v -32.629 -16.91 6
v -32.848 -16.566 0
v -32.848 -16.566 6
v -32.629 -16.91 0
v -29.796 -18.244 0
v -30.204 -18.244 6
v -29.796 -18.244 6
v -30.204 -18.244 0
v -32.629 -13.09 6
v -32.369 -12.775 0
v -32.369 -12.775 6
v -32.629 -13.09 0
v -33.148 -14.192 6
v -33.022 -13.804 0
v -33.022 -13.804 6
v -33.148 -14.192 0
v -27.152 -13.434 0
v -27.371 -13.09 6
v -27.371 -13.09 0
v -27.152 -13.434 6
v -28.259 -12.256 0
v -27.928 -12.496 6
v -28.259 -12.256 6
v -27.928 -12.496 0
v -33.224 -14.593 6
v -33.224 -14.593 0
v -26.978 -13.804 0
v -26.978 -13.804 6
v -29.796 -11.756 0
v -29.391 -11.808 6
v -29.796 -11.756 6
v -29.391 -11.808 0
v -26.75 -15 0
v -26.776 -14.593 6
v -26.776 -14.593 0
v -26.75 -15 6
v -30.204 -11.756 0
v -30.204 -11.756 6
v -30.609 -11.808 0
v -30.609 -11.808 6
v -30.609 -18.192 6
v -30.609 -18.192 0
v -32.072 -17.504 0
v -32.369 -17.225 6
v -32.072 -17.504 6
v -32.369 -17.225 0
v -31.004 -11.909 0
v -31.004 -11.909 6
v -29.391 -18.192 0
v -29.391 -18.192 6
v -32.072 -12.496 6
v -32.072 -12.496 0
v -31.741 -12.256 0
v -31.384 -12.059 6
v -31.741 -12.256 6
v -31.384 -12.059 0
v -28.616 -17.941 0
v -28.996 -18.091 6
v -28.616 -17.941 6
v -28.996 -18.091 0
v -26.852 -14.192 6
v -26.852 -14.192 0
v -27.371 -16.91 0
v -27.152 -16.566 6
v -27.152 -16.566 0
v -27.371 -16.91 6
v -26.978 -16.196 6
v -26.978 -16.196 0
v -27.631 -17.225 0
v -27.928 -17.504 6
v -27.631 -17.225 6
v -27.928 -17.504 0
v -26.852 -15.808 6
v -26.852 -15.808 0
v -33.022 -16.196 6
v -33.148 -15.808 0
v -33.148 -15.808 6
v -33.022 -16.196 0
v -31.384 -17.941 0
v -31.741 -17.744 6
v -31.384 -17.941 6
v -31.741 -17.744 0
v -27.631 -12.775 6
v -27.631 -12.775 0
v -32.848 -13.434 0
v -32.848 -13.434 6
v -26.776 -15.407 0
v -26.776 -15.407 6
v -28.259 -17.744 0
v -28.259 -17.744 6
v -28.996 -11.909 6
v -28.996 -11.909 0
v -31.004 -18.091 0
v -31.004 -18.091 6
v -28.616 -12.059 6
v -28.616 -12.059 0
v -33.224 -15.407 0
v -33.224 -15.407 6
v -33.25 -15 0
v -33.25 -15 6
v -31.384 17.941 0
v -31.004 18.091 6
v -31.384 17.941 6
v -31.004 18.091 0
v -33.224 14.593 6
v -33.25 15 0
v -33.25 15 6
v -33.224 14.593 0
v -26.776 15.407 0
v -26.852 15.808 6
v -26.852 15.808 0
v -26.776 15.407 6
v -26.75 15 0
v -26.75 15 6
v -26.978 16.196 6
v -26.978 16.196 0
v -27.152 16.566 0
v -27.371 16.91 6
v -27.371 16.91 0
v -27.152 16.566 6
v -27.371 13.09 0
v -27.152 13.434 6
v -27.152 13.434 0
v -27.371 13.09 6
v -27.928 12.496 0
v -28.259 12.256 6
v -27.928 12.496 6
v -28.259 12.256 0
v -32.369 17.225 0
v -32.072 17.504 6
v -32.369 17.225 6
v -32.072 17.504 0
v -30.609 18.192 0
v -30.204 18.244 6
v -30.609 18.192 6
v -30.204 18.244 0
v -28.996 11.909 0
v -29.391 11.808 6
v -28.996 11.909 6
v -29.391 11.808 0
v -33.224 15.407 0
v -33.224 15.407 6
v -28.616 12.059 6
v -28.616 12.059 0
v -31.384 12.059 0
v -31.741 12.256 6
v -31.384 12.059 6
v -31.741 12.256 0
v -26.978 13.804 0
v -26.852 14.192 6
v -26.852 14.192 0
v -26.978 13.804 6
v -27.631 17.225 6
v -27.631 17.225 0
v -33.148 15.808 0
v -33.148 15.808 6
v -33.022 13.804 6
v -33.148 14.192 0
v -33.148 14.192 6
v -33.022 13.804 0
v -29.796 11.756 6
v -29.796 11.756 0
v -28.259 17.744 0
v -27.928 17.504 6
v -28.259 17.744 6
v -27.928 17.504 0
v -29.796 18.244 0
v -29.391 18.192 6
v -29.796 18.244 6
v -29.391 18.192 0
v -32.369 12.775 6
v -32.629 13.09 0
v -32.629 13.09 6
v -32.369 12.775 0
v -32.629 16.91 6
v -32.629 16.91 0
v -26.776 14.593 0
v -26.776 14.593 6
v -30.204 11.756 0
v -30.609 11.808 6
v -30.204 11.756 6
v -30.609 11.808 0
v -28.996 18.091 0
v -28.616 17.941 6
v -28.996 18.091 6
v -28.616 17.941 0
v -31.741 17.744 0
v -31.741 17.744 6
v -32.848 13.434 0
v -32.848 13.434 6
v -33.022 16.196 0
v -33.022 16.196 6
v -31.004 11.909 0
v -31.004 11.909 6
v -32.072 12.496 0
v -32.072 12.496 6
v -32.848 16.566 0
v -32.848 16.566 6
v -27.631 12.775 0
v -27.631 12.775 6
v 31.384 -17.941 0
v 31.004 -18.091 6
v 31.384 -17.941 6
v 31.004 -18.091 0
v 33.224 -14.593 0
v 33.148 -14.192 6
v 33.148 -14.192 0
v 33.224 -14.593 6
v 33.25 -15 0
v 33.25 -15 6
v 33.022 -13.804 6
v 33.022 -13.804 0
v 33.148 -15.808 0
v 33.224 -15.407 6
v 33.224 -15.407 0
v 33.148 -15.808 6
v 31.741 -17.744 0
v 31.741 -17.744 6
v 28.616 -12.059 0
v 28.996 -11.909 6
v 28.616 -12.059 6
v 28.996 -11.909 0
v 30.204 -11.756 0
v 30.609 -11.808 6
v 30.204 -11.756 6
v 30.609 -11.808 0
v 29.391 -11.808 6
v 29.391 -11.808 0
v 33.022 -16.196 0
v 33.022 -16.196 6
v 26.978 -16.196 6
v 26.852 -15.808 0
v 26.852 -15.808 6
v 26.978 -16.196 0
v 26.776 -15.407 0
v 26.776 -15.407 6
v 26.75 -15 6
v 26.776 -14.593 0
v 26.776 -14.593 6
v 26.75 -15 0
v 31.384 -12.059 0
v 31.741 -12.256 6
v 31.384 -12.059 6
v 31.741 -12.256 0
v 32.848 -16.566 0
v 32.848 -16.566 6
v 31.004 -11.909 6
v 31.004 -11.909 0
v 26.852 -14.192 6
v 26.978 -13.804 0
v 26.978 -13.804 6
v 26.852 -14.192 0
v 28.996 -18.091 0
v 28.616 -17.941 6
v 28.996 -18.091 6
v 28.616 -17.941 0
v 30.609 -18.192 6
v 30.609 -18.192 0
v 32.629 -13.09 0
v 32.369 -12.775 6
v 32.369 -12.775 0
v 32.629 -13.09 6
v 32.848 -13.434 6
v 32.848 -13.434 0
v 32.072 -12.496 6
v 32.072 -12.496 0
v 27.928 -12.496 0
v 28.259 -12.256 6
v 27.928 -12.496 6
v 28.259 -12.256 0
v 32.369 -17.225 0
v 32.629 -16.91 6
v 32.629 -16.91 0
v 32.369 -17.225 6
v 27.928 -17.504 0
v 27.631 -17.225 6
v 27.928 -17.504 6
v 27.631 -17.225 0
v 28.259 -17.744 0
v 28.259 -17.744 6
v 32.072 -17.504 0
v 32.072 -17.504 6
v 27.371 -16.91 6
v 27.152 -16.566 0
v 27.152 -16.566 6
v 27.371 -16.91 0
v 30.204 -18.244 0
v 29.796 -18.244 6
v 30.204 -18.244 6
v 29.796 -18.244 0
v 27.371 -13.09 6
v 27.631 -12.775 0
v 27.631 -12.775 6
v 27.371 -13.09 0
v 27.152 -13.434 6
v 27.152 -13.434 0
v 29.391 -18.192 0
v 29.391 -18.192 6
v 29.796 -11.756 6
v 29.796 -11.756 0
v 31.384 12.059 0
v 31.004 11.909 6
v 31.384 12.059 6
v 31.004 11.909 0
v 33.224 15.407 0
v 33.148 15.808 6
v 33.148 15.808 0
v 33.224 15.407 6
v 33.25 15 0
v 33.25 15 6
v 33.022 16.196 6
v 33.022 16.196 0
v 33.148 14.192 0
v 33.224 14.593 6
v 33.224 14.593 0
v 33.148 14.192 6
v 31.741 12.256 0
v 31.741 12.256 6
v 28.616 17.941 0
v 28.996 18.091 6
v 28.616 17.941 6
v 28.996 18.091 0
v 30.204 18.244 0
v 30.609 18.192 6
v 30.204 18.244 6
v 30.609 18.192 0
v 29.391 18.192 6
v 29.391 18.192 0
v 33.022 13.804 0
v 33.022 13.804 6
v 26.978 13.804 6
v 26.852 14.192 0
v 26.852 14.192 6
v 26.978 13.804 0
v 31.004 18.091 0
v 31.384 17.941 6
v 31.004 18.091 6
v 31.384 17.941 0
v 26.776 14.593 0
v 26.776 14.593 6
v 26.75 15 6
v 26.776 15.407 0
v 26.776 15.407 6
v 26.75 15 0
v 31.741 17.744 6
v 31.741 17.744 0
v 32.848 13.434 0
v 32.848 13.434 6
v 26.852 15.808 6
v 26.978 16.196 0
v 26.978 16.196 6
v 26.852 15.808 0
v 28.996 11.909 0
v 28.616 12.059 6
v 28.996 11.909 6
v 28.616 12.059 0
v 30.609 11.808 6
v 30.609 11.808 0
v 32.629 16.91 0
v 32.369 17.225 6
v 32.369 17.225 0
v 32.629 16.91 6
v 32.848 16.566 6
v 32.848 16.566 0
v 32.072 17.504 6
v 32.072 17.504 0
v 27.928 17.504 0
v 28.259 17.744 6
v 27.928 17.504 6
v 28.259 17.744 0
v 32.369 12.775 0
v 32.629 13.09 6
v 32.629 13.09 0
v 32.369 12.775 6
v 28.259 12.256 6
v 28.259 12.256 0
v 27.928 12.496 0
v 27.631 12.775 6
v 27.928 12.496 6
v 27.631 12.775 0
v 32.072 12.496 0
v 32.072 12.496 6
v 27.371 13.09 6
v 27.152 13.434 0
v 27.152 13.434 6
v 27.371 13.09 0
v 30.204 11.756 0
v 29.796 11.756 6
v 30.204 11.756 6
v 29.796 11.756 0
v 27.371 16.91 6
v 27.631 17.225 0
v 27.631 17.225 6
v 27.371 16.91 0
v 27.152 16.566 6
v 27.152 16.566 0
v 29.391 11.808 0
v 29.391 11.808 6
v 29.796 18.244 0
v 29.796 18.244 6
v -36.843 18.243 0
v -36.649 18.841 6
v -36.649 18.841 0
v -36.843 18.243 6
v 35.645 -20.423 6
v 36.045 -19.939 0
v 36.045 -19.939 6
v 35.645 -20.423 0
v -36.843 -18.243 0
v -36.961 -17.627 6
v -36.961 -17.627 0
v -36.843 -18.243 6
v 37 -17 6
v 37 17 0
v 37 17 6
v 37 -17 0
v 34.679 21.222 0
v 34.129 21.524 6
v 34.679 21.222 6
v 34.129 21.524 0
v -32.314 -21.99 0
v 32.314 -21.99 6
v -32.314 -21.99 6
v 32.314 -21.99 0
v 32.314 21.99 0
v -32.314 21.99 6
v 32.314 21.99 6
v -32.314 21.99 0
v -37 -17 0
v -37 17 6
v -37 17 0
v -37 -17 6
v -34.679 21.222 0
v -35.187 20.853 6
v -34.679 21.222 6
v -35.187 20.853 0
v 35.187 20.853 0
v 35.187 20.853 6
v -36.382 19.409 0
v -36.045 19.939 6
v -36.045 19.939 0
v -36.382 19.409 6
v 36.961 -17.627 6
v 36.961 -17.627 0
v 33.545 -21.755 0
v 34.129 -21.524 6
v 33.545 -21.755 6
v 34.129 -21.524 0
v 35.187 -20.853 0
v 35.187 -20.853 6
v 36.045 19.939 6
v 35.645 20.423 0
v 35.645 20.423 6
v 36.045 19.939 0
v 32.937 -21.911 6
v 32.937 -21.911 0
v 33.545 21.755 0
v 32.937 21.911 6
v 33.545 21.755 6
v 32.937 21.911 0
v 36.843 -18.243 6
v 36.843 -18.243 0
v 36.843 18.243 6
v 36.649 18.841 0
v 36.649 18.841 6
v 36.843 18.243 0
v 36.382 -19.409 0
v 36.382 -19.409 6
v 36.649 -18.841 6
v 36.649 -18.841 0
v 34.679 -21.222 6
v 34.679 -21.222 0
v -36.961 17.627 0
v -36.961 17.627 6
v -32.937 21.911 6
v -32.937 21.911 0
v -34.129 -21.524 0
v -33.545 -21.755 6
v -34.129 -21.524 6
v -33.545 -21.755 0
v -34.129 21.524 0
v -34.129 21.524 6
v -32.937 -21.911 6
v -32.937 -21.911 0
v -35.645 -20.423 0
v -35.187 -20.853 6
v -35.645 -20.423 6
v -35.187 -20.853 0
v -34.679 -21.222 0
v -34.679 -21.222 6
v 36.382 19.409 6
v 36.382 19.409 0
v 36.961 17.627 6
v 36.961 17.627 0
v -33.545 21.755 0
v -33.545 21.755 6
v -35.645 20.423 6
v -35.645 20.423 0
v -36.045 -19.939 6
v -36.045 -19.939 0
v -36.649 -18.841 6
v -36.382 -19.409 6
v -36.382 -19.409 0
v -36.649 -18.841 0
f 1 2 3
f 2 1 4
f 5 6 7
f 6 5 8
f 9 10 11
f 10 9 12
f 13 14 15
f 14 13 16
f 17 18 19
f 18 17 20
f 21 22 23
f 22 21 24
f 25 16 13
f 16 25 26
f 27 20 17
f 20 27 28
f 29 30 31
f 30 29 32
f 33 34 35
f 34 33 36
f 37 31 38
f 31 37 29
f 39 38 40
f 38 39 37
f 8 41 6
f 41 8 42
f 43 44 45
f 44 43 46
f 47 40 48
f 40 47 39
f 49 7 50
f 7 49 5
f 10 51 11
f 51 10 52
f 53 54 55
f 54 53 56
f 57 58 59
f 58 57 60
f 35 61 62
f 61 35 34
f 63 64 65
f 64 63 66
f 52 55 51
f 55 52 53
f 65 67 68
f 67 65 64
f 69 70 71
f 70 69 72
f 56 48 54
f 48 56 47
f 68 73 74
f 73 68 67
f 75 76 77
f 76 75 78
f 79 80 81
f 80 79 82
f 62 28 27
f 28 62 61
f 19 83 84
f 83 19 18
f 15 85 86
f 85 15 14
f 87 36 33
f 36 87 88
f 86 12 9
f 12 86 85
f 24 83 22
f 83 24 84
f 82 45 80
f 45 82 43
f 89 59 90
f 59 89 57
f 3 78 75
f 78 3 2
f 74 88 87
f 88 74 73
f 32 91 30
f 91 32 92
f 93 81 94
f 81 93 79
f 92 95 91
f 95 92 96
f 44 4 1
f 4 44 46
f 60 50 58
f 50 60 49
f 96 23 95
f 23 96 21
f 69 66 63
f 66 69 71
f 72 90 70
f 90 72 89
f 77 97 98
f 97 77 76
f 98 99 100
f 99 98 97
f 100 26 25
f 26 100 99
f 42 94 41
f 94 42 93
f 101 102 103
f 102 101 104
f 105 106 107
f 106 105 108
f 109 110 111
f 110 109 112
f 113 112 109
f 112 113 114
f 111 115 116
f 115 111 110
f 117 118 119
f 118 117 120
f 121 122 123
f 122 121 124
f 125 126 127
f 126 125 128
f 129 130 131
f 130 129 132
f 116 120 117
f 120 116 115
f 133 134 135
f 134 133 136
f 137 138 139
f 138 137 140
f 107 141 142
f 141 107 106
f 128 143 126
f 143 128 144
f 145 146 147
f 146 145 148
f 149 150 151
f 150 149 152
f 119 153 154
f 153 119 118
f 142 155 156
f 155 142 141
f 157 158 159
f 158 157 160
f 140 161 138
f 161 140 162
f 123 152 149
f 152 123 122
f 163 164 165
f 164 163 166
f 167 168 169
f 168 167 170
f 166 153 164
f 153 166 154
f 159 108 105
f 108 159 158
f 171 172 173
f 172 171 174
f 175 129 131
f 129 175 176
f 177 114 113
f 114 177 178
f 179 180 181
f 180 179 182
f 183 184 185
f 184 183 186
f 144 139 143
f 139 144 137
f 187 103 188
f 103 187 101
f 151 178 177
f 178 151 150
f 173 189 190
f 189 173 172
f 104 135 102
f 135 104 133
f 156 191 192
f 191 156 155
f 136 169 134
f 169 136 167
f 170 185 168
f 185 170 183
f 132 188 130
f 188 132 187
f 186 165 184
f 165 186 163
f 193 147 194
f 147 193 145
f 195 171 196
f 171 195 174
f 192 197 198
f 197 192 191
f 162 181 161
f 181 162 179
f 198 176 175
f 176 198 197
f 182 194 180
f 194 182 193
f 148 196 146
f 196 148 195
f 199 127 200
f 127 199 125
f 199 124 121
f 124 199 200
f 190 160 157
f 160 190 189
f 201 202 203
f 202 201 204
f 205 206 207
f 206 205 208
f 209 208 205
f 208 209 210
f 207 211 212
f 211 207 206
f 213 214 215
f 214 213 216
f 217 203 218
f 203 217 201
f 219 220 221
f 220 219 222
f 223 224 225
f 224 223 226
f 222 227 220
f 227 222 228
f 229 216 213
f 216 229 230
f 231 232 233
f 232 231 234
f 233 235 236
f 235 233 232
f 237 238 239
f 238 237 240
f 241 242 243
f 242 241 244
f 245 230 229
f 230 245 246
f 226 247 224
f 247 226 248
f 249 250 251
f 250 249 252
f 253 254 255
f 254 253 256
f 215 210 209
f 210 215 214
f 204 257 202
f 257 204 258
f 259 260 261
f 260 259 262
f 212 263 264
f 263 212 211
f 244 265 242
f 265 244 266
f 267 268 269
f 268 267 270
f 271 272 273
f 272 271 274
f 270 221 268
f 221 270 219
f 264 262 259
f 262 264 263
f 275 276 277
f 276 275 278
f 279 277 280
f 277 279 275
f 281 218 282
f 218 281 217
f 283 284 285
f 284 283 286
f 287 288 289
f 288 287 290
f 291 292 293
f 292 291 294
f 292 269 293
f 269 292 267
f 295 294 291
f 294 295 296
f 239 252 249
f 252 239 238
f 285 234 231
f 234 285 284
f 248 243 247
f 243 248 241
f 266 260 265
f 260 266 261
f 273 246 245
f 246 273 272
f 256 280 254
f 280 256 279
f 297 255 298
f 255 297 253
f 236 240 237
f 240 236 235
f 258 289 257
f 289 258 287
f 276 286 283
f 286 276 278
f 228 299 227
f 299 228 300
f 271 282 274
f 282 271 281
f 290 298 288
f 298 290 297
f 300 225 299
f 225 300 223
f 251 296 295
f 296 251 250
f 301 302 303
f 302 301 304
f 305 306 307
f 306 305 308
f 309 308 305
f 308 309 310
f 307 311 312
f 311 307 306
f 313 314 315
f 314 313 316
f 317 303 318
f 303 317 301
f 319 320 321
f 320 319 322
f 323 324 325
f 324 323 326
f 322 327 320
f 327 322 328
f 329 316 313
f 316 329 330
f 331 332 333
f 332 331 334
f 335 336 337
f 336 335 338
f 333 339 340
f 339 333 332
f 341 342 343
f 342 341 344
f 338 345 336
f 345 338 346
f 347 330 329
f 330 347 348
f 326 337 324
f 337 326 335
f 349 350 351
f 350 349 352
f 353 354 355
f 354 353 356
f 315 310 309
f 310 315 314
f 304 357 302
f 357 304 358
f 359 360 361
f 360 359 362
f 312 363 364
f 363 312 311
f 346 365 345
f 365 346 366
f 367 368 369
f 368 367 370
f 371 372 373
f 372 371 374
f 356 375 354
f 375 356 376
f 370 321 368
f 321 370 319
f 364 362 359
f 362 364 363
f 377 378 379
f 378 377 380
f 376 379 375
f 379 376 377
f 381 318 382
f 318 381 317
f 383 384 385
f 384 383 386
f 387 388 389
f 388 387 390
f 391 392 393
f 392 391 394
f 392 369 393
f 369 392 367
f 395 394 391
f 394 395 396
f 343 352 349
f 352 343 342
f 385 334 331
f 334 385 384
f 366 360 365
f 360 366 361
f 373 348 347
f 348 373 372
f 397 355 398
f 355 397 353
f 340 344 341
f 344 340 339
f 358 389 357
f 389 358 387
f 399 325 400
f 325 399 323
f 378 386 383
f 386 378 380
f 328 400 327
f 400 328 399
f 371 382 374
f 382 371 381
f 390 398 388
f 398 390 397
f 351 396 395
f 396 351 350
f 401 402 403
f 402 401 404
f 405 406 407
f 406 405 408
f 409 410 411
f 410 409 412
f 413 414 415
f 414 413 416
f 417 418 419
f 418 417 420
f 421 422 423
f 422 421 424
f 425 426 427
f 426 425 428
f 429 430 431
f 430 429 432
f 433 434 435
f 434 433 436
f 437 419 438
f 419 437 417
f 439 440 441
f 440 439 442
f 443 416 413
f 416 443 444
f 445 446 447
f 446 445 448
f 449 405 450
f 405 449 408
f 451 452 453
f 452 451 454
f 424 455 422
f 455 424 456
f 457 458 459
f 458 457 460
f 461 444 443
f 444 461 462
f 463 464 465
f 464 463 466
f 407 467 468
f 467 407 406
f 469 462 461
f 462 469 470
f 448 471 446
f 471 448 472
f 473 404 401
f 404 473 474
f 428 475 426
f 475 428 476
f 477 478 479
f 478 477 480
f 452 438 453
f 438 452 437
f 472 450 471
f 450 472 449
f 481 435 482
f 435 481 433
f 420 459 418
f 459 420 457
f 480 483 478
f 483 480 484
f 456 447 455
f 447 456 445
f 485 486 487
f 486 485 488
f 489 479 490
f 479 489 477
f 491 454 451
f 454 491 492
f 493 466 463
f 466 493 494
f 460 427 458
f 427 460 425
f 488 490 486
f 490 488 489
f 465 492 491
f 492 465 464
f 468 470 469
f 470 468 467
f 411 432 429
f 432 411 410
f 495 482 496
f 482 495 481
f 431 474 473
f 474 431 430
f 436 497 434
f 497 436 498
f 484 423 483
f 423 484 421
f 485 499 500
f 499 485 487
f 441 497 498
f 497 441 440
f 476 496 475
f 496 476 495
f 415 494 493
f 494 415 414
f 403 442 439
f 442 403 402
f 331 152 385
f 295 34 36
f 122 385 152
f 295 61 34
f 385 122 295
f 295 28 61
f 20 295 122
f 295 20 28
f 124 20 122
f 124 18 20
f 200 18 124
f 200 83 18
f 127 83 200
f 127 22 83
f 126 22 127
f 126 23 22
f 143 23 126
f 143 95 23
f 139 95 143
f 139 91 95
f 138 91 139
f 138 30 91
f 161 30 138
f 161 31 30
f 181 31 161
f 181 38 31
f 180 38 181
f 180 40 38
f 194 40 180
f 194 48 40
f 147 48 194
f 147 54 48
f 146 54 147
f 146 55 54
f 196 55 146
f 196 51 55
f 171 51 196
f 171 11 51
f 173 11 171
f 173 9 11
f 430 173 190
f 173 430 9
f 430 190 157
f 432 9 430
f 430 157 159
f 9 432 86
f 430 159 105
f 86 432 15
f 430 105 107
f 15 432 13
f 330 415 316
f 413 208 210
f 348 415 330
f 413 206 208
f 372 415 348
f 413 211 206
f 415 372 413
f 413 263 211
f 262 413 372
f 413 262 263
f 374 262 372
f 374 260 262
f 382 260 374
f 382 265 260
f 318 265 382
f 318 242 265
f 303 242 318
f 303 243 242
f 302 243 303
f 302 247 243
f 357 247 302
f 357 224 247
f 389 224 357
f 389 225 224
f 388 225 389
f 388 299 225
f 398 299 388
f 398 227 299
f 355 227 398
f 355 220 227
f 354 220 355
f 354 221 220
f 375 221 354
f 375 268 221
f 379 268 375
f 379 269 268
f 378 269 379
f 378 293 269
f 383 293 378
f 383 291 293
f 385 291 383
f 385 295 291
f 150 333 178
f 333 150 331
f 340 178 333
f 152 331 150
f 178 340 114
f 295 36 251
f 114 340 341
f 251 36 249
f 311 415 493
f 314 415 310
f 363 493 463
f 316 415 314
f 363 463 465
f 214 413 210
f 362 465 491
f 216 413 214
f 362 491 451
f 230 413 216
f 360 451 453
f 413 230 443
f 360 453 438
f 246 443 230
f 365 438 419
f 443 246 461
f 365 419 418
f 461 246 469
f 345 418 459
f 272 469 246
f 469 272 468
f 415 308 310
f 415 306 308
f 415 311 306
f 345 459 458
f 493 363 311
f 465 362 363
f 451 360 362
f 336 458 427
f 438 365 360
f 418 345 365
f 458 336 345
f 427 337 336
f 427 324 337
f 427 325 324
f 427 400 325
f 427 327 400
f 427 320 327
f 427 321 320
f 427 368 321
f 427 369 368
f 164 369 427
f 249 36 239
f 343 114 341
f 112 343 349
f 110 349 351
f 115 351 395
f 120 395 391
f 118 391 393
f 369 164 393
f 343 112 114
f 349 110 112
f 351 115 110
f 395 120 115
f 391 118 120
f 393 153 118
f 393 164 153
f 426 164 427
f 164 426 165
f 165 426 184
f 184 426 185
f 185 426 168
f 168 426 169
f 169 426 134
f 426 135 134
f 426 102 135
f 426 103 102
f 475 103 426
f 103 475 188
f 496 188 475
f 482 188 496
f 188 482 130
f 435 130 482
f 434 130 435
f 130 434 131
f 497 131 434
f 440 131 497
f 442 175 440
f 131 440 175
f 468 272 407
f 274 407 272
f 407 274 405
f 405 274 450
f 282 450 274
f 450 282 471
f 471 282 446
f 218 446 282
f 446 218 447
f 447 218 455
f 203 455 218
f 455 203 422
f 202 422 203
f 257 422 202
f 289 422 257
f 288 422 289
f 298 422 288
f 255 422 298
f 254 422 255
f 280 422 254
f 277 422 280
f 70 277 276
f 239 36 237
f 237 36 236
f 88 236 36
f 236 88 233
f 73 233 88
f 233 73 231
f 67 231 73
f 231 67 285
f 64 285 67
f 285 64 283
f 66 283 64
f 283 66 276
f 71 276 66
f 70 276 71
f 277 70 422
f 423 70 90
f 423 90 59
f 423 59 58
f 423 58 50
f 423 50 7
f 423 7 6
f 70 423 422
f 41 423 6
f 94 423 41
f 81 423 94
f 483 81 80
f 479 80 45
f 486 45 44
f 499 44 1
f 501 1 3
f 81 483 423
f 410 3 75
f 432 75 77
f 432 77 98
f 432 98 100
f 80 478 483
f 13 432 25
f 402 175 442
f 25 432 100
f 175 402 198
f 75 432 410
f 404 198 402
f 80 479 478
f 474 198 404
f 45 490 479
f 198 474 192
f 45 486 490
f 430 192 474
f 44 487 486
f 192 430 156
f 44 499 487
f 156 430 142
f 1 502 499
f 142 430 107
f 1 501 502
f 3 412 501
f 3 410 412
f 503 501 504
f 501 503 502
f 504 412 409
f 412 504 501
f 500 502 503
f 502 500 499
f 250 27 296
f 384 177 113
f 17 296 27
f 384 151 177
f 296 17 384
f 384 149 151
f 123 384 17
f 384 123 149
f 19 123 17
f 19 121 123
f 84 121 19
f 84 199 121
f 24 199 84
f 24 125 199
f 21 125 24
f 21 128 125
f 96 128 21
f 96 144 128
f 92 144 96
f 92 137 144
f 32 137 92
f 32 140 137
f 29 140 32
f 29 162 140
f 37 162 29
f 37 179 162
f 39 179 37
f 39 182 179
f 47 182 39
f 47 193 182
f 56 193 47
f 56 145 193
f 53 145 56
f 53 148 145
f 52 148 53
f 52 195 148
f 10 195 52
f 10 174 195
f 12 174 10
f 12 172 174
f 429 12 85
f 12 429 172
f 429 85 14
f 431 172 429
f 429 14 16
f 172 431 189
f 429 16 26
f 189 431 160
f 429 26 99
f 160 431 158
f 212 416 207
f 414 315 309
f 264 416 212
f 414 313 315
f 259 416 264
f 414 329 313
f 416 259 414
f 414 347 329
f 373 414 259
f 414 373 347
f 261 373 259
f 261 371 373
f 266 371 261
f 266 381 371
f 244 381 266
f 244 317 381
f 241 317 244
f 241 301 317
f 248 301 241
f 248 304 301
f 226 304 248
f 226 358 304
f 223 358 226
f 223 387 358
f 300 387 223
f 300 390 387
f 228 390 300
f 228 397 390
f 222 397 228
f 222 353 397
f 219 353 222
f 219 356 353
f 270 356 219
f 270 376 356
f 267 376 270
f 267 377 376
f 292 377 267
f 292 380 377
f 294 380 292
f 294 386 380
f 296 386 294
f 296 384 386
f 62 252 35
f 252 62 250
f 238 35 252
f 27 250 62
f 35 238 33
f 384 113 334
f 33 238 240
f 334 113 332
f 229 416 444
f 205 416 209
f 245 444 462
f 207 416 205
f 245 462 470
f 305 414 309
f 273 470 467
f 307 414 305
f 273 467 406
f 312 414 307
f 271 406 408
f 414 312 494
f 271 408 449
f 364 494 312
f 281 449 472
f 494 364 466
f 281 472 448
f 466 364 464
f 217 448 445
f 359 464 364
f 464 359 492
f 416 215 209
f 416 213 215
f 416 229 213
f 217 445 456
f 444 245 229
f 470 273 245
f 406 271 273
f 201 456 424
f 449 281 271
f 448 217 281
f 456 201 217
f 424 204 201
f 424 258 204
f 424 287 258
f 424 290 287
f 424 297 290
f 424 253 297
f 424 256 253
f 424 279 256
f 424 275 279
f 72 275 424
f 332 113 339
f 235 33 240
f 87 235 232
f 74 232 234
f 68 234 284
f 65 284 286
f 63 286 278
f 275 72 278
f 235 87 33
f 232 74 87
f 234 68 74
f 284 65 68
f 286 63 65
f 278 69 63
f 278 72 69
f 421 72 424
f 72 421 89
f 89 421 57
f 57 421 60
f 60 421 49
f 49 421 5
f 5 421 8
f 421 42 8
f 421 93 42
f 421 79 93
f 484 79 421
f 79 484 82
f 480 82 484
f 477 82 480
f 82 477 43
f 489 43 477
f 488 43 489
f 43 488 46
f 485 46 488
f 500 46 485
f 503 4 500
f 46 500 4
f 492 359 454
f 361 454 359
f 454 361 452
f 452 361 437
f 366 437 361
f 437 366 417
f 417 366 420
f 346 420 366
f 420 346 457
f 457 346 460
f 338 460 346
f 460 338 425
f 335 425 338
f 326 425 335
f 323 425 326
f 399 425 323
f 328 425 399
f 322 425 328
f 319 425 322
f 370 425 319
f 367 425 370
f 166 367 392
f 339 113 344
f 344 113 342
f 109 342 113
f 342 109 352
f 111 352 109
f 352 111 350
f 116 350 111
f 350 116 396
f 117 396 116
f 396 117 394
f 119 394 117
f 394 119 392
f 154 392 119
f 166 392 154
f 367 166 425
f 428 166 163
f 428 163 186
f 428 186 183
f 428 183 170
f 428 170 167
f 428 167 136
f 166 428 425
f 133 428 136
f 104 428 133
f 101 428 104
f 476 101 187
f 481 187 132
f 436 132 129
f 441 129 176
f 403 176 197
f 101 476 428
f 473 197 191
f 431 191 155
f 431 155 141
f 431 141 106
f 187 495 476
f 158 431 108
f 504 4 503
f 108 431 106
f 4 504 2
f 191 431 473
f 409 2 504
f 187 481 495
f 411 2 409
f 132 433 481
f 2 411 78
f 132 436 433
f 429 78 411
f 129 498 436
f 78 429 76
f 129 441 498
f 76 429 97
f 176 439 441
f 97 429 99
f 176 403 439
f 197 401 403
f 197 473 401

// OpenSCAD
$fn = 50;


difference() {
	union() {
		hull() {
			translate(v = [-32.0000000000, 17.0000000000, 0]) {
				cylinder(h = 6, r = 5);
			}
			translate(v = [32.0000000000, 17.0000000000, 0]) {
				cylinder(h = 6, r = 5);
			}
			translate(v = [-32.0000000000, -17.0000000000, 0]) {
				cylinder(h = 6, r = 5);
			}
			translate(v = [32.0000000000, -17.0000000000, 0]) {
				cylinder(h = 6, r = 5);
			}
		}
	}
	union() {
		translate(v = [-30.0000000000, -15.0000000000, -100.0000000000]) {
			cylinder(h = 200, r = 3.2500000000);
		}
		translate(v = [-30.0000000000, 15.0000000000, -100.0000000000]) {
			cylinder(h = 200, r = 3.2500000000);
		}
		translate(v = [30.0000000000, -15.0000000000, -100.0000000000]) {
			cylinder(h = 200, r = 3.2500000000);
		}
		translate(v = [30.0000000000, 15.0000000000, -100.0000000000]) {
			cylinder(h = 200, r = 3.2500000000);
		}
	}
}
